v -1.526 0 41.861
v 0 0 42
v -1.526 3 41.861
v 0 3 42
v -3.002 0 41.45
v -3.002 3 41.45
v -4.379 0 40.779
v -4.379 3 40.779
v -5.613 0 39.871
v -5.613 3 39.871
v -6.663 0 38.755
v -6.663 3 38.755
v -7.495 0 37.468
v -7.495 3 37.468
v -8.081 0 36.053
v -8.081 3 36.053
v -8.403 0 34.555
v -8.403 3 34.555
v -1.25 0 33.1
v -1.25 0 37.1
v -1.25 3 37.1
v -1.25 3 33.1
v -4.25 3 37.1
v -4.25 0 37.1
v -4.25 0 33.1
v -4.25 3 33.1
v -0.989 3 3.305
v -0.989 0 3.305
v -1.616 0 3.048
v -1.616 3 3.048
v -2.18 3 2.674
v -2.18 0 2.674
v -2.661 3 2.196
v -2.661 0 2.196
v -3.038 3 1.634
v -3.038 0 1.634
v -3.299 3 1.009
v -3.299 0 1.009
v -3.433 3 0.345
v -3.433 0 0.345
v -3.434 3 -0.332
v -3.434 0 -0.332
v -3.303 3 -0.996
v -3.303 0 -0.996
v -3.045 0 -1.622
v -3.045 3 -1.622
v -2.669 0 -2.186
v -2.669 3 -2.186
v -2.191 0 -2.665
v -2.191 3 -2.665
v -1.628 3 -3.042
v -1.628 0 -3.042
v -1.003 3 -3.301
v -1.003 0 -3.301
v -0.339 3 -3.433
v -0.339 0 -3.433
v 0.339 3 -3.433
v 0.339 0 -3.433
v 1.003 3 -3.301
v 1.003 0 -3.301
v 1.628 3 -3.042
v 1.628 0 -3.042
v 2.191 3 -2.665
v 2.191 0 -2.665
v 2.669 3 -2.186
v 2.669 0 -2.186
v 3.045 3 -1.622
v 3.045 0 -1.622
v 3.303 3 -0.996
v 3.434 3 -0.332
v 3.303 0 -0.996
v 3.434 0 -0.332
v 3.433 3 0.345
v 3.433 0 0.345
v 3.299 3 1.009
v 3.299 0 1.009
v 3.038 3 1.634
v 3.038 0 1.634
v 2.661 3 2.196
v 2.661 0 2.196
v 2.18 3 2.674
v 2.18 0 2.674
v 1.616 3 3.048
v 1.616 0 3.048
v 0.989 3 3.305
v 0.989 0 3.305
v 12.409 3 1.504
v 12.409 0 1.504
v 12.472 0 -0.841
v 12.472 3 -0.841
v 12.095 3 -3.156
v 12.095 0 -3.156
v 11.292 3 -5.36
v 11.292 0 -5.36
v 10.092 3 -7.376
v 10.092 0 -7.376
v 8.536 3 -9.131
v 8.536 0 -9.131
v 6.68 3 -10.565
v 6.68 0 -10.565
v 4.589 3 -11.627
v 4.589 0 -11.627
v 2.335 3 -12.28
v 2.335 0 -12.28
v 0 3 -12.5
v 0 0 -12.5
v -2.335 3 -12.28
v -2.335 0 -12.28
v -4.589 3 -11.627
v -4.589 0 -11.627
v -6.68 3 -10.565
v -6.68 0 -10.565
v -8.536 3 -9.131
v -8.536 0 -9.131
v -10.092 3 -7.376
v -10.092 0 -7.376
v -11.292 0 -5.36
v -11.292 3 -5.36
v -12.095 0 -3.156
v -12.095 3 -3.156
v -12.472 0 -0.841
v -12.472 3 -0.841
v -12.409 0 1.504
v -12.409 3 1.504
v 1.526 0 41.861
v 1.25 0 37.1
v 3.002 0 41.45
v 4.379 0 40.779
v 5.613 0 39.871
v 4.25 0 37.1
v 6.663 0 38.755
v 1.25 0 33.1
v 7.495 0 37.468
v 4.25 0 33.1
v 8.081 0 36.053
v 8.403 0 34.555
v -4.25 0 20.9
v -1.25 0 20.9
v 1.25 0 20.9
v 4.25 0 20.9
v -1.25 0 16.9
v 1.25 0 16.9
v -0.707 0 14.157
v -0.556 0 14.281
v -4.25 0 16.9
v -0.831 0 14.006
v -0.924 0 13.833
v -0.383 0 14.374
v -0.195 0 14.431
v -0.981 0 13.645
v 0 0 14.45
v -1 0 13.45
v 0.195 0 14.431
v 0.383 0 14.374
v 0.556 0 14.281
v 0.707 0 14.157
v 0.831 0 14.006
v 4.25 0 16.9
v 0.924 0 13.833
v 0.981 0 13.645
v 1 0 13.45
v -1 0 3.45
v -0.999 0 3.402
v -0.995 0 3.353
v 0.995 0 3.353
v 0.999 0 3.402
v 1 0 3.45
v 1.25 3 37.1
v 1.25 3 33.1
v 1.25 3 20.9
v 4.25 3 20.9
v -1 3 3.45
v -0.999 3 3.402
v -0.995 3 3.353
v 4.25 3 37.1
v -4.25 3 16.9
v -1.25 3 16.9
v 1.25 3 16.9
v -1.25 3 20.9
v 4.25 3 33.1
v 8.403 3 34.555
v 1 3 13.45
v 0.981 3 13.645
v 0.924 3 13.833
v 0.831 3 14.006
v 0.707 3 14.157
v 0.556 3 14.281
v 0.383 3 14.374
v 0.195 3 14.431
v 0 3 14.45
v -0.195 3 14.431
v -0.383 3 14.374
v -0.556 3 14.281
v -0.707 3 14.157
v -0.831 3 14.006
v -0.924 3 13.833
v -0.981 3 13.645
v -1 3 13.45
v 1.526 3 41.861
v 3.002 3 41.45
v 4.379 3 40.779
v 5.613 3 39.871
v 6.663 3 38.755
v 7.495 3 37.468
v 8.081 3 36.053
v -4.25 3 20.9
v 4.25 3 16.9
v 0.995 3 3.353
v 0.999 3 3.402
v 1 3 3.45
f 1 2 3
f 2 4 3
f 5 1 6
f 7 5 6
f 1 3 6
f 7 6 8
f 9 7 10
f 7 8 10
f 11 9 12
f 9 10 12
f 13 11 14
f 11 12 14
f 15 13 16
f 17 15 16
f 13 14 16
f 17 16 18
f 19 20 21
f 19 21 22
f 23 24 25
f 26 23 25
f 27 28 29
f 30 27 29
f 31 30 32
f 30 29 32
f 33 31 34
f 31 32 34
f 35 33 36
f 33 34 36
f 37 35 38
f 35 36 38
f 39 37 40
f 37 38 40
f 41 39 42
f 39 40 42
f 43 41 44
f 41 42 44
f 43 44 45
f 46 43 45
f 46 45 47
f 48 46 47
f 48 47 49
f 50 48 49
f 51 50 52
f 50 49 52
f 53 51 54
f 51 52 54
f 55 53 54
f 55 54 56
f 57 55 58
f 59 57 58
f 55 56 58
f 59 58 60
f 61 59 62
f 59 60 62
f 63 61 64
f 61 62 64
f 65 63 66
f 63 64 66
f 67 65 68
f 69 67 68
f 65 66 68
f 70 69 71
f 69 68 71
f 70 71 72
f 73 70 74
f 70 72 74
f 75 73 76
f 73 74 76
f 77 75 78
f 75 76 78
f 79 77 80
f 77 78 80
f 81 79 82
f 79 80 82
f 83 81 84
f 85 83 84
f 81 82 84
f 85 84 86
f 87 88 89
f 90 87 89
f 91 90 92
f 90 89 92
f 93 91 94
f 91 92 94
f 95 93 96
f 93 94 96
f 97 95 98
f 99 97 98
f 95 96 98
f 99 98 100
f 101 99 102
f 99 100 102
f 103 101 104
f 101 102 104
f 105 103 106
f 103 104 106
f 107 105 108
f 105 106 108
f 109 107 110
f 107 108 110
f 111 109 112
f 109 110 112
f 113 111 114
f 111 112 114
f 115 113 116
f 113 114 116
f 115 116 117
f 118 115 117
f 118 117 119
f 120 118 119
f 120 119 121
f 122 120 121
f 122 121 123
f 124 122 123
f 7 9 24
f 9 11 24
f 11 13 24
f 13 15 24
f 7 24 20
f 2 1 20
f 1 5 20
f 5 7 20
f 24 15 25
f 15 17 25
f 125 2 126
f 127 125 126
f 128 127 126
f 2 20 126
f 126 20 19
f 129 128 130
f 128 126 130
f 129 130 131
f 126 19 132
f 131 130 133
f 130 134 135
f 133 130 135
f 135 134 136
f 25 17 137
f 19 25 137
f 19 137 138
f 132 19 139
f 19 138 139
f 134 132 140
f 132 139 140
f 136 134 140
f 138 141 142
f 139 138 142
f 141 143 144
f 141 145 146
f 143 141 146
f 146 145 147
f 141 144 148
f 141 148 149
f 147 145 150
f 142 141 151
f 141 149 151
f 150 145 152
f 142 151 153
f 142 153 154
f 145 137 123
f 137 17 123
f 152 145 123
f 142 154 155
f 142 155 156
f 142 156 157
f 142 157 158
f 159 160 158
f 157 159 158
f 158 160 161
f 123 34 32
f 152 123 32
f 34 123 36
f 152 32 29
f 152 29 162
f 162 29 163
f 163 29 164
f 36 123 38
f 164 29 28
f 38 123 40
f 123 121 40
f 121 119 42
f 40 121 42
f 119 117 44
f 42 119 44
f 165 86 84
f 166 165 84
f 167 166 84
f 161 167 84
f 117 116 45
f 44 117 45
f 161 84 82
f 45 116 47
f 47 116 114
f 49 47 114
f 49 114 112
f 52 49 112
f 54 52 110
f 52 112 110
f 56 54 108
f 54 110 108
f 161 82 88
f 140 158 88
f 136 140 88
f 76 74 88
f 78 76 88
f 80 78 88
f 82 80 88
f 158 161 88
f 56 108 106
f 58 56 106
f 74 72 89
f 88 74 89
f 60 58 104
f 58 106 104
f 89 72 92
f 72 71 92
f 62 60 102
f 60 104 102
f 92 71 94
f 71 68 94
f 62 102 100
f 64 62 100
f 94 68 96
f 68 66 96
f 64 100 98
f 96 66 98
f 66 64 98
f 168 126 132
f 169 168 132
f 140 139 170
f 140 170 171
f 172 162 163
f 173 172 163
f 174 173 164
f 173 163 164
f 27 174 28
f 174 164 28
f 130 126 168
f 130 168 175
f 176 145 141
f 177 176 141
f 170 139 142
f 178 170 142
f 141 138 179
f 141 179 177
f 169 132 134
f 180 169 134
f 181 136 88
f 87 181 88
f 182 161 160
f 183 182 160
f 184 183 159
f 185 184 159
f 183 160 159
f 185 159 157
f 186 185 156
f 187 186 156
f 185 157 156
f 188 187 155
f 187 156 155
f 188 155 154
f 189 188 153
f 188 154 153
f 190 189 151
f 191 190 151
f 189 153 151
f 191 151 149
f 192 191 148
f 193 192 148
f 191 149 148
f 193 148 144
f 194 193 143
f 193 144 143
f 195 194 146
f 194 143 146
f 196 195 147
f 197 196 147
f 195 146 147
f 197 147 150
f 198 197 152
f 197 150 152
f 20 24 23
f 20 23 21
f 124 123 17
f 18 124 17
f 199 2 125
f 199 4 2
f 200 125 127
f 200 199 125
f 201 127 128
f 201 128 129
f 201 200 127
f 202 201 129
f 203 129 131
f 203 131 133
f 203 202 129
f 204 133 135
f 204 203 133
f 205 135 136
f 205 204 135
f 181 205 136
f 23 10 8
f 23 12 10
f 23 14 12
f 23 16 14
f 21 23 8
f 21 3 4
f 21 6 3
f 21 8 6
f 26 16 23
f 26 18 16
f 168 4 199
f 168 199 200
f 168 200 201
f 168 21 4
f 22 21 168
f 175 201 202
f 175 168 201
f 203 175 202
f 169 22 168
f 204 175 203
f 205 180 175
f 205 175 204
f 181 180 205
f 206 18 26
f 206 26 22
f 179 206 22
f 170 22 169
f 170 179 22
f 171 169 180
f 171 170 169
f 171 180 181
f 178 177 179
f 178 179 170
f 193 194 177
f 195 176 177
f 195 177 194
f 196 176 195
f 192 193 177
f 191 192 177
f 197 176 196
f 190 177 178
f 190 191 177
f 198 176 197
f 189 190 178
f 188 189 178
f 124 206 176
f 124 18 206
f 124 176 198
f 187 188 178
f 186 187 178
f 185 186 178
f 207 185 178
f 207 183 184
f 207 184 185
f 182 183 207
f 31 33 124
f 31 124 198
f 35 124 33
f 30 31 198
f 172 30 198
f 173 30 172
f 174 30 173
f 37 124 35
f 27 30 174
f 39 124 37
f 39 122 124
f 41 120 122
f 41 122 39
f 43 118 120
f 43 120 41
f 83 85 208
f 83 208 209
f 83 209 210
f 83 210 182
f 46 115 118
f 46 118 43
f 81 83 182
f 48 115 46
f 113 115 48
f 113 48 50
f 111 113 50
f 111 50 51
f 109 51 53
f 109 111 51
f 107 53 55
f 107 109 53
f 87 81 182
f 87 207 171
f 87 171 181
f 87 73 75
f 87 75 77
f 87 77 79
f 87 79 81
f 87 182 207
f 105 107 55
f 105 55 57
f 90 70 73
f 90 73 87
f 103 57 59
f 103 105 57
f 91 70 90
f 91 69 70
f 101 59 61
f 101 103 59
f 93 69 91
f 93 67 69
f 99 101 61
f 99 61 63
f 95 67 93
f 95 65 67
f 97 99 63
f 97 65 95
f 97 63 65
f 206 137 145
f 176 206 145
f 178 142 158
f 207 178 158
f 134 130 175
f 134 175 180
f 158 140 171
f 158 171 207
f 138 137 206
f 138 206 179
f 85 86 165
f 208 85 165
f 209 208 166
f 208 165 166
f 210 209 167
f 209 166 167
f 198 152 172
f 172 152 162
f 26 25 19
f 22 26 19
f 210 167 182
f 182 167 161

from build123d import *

# Parameters (mm, degrees)
SKETCH1_W           = 3
SKETCH1_H           = 4
BOSS_EXTRUDE2_DEPTH = 3
FILLET1_R           = 8.464107


with BuildPart() as part:
    # Sketch1 → Boss-Extrude2 (new body)
    with BuildSketch(Plane(origin=(0, 0, 0), x_dir=(1, 0, 0), z_dir=(0, 1, 0))):
        with BuildLine():
            Line((-7.5, -42), (7.5, -42))
            Line((7.5, -42), (12.409150917, -1.504318289))
            ThreePointArc((12.409150917, -1.504318289), (0, 12.5), (-12.409150917, -1.504318289))
            Line((-12.409150917, -1.504318289), (-7.5, -42))
        make_face()
        with BuildLine():
            ThreePointArc((-1, -3.45), (-0.997357075, -3.377344208), (-0.989442272, -3.305072464))
            ThreePointArc((-0.989442272, -3.305072464), (0, 3.45), (0.989442272, -3.305072464))
            ThreePointArc((0.989442272, -3.305072464), (0.997357075, -3.377344208), (1, -3.45))
            Line((1, -3.45), (1, -13.45))
            ThreePointArc((1, -13.45), (0, -14.45), (-1, -13.45))
            Line((-1, -13.45), (-1, -3.45))
        make_face(mode=Mode.SUBTRACT)
        with Locations((-2.75, -35.1)):
            Rectangle(SKETCH1_W, SKETCH1_H, mode=Mode.SUBTRACT)
        with Locations((-2.75, -18.9)):
            Rectangle(SKETCH1_W, SKETCH1_H, mode=Mode.SUBTRACT)
        with Locations((2.75, -35.1)):
            Rectangle(SKETCH1_W, SKETCH1_H, mode=Mode.SUBTRACT)
        with Locations((2.75, -18.9)):
            Rectangle(SKETCH1_W, SKETCH1_H, mode=Mode.SUBTRACT)
    extrude(amount=BOSS_EXTRUDE2_DEPTH)

    # Fillet1
    fillet1_edges = [part.edges().sort_by_distance(p)[0] for p in [
        (-7.5, 1.5, 42),
        (7.5, 1.5, 42),
    ]]
    fillet(fillet1_edges, radius=FILLET1_R)


solid = part.part
